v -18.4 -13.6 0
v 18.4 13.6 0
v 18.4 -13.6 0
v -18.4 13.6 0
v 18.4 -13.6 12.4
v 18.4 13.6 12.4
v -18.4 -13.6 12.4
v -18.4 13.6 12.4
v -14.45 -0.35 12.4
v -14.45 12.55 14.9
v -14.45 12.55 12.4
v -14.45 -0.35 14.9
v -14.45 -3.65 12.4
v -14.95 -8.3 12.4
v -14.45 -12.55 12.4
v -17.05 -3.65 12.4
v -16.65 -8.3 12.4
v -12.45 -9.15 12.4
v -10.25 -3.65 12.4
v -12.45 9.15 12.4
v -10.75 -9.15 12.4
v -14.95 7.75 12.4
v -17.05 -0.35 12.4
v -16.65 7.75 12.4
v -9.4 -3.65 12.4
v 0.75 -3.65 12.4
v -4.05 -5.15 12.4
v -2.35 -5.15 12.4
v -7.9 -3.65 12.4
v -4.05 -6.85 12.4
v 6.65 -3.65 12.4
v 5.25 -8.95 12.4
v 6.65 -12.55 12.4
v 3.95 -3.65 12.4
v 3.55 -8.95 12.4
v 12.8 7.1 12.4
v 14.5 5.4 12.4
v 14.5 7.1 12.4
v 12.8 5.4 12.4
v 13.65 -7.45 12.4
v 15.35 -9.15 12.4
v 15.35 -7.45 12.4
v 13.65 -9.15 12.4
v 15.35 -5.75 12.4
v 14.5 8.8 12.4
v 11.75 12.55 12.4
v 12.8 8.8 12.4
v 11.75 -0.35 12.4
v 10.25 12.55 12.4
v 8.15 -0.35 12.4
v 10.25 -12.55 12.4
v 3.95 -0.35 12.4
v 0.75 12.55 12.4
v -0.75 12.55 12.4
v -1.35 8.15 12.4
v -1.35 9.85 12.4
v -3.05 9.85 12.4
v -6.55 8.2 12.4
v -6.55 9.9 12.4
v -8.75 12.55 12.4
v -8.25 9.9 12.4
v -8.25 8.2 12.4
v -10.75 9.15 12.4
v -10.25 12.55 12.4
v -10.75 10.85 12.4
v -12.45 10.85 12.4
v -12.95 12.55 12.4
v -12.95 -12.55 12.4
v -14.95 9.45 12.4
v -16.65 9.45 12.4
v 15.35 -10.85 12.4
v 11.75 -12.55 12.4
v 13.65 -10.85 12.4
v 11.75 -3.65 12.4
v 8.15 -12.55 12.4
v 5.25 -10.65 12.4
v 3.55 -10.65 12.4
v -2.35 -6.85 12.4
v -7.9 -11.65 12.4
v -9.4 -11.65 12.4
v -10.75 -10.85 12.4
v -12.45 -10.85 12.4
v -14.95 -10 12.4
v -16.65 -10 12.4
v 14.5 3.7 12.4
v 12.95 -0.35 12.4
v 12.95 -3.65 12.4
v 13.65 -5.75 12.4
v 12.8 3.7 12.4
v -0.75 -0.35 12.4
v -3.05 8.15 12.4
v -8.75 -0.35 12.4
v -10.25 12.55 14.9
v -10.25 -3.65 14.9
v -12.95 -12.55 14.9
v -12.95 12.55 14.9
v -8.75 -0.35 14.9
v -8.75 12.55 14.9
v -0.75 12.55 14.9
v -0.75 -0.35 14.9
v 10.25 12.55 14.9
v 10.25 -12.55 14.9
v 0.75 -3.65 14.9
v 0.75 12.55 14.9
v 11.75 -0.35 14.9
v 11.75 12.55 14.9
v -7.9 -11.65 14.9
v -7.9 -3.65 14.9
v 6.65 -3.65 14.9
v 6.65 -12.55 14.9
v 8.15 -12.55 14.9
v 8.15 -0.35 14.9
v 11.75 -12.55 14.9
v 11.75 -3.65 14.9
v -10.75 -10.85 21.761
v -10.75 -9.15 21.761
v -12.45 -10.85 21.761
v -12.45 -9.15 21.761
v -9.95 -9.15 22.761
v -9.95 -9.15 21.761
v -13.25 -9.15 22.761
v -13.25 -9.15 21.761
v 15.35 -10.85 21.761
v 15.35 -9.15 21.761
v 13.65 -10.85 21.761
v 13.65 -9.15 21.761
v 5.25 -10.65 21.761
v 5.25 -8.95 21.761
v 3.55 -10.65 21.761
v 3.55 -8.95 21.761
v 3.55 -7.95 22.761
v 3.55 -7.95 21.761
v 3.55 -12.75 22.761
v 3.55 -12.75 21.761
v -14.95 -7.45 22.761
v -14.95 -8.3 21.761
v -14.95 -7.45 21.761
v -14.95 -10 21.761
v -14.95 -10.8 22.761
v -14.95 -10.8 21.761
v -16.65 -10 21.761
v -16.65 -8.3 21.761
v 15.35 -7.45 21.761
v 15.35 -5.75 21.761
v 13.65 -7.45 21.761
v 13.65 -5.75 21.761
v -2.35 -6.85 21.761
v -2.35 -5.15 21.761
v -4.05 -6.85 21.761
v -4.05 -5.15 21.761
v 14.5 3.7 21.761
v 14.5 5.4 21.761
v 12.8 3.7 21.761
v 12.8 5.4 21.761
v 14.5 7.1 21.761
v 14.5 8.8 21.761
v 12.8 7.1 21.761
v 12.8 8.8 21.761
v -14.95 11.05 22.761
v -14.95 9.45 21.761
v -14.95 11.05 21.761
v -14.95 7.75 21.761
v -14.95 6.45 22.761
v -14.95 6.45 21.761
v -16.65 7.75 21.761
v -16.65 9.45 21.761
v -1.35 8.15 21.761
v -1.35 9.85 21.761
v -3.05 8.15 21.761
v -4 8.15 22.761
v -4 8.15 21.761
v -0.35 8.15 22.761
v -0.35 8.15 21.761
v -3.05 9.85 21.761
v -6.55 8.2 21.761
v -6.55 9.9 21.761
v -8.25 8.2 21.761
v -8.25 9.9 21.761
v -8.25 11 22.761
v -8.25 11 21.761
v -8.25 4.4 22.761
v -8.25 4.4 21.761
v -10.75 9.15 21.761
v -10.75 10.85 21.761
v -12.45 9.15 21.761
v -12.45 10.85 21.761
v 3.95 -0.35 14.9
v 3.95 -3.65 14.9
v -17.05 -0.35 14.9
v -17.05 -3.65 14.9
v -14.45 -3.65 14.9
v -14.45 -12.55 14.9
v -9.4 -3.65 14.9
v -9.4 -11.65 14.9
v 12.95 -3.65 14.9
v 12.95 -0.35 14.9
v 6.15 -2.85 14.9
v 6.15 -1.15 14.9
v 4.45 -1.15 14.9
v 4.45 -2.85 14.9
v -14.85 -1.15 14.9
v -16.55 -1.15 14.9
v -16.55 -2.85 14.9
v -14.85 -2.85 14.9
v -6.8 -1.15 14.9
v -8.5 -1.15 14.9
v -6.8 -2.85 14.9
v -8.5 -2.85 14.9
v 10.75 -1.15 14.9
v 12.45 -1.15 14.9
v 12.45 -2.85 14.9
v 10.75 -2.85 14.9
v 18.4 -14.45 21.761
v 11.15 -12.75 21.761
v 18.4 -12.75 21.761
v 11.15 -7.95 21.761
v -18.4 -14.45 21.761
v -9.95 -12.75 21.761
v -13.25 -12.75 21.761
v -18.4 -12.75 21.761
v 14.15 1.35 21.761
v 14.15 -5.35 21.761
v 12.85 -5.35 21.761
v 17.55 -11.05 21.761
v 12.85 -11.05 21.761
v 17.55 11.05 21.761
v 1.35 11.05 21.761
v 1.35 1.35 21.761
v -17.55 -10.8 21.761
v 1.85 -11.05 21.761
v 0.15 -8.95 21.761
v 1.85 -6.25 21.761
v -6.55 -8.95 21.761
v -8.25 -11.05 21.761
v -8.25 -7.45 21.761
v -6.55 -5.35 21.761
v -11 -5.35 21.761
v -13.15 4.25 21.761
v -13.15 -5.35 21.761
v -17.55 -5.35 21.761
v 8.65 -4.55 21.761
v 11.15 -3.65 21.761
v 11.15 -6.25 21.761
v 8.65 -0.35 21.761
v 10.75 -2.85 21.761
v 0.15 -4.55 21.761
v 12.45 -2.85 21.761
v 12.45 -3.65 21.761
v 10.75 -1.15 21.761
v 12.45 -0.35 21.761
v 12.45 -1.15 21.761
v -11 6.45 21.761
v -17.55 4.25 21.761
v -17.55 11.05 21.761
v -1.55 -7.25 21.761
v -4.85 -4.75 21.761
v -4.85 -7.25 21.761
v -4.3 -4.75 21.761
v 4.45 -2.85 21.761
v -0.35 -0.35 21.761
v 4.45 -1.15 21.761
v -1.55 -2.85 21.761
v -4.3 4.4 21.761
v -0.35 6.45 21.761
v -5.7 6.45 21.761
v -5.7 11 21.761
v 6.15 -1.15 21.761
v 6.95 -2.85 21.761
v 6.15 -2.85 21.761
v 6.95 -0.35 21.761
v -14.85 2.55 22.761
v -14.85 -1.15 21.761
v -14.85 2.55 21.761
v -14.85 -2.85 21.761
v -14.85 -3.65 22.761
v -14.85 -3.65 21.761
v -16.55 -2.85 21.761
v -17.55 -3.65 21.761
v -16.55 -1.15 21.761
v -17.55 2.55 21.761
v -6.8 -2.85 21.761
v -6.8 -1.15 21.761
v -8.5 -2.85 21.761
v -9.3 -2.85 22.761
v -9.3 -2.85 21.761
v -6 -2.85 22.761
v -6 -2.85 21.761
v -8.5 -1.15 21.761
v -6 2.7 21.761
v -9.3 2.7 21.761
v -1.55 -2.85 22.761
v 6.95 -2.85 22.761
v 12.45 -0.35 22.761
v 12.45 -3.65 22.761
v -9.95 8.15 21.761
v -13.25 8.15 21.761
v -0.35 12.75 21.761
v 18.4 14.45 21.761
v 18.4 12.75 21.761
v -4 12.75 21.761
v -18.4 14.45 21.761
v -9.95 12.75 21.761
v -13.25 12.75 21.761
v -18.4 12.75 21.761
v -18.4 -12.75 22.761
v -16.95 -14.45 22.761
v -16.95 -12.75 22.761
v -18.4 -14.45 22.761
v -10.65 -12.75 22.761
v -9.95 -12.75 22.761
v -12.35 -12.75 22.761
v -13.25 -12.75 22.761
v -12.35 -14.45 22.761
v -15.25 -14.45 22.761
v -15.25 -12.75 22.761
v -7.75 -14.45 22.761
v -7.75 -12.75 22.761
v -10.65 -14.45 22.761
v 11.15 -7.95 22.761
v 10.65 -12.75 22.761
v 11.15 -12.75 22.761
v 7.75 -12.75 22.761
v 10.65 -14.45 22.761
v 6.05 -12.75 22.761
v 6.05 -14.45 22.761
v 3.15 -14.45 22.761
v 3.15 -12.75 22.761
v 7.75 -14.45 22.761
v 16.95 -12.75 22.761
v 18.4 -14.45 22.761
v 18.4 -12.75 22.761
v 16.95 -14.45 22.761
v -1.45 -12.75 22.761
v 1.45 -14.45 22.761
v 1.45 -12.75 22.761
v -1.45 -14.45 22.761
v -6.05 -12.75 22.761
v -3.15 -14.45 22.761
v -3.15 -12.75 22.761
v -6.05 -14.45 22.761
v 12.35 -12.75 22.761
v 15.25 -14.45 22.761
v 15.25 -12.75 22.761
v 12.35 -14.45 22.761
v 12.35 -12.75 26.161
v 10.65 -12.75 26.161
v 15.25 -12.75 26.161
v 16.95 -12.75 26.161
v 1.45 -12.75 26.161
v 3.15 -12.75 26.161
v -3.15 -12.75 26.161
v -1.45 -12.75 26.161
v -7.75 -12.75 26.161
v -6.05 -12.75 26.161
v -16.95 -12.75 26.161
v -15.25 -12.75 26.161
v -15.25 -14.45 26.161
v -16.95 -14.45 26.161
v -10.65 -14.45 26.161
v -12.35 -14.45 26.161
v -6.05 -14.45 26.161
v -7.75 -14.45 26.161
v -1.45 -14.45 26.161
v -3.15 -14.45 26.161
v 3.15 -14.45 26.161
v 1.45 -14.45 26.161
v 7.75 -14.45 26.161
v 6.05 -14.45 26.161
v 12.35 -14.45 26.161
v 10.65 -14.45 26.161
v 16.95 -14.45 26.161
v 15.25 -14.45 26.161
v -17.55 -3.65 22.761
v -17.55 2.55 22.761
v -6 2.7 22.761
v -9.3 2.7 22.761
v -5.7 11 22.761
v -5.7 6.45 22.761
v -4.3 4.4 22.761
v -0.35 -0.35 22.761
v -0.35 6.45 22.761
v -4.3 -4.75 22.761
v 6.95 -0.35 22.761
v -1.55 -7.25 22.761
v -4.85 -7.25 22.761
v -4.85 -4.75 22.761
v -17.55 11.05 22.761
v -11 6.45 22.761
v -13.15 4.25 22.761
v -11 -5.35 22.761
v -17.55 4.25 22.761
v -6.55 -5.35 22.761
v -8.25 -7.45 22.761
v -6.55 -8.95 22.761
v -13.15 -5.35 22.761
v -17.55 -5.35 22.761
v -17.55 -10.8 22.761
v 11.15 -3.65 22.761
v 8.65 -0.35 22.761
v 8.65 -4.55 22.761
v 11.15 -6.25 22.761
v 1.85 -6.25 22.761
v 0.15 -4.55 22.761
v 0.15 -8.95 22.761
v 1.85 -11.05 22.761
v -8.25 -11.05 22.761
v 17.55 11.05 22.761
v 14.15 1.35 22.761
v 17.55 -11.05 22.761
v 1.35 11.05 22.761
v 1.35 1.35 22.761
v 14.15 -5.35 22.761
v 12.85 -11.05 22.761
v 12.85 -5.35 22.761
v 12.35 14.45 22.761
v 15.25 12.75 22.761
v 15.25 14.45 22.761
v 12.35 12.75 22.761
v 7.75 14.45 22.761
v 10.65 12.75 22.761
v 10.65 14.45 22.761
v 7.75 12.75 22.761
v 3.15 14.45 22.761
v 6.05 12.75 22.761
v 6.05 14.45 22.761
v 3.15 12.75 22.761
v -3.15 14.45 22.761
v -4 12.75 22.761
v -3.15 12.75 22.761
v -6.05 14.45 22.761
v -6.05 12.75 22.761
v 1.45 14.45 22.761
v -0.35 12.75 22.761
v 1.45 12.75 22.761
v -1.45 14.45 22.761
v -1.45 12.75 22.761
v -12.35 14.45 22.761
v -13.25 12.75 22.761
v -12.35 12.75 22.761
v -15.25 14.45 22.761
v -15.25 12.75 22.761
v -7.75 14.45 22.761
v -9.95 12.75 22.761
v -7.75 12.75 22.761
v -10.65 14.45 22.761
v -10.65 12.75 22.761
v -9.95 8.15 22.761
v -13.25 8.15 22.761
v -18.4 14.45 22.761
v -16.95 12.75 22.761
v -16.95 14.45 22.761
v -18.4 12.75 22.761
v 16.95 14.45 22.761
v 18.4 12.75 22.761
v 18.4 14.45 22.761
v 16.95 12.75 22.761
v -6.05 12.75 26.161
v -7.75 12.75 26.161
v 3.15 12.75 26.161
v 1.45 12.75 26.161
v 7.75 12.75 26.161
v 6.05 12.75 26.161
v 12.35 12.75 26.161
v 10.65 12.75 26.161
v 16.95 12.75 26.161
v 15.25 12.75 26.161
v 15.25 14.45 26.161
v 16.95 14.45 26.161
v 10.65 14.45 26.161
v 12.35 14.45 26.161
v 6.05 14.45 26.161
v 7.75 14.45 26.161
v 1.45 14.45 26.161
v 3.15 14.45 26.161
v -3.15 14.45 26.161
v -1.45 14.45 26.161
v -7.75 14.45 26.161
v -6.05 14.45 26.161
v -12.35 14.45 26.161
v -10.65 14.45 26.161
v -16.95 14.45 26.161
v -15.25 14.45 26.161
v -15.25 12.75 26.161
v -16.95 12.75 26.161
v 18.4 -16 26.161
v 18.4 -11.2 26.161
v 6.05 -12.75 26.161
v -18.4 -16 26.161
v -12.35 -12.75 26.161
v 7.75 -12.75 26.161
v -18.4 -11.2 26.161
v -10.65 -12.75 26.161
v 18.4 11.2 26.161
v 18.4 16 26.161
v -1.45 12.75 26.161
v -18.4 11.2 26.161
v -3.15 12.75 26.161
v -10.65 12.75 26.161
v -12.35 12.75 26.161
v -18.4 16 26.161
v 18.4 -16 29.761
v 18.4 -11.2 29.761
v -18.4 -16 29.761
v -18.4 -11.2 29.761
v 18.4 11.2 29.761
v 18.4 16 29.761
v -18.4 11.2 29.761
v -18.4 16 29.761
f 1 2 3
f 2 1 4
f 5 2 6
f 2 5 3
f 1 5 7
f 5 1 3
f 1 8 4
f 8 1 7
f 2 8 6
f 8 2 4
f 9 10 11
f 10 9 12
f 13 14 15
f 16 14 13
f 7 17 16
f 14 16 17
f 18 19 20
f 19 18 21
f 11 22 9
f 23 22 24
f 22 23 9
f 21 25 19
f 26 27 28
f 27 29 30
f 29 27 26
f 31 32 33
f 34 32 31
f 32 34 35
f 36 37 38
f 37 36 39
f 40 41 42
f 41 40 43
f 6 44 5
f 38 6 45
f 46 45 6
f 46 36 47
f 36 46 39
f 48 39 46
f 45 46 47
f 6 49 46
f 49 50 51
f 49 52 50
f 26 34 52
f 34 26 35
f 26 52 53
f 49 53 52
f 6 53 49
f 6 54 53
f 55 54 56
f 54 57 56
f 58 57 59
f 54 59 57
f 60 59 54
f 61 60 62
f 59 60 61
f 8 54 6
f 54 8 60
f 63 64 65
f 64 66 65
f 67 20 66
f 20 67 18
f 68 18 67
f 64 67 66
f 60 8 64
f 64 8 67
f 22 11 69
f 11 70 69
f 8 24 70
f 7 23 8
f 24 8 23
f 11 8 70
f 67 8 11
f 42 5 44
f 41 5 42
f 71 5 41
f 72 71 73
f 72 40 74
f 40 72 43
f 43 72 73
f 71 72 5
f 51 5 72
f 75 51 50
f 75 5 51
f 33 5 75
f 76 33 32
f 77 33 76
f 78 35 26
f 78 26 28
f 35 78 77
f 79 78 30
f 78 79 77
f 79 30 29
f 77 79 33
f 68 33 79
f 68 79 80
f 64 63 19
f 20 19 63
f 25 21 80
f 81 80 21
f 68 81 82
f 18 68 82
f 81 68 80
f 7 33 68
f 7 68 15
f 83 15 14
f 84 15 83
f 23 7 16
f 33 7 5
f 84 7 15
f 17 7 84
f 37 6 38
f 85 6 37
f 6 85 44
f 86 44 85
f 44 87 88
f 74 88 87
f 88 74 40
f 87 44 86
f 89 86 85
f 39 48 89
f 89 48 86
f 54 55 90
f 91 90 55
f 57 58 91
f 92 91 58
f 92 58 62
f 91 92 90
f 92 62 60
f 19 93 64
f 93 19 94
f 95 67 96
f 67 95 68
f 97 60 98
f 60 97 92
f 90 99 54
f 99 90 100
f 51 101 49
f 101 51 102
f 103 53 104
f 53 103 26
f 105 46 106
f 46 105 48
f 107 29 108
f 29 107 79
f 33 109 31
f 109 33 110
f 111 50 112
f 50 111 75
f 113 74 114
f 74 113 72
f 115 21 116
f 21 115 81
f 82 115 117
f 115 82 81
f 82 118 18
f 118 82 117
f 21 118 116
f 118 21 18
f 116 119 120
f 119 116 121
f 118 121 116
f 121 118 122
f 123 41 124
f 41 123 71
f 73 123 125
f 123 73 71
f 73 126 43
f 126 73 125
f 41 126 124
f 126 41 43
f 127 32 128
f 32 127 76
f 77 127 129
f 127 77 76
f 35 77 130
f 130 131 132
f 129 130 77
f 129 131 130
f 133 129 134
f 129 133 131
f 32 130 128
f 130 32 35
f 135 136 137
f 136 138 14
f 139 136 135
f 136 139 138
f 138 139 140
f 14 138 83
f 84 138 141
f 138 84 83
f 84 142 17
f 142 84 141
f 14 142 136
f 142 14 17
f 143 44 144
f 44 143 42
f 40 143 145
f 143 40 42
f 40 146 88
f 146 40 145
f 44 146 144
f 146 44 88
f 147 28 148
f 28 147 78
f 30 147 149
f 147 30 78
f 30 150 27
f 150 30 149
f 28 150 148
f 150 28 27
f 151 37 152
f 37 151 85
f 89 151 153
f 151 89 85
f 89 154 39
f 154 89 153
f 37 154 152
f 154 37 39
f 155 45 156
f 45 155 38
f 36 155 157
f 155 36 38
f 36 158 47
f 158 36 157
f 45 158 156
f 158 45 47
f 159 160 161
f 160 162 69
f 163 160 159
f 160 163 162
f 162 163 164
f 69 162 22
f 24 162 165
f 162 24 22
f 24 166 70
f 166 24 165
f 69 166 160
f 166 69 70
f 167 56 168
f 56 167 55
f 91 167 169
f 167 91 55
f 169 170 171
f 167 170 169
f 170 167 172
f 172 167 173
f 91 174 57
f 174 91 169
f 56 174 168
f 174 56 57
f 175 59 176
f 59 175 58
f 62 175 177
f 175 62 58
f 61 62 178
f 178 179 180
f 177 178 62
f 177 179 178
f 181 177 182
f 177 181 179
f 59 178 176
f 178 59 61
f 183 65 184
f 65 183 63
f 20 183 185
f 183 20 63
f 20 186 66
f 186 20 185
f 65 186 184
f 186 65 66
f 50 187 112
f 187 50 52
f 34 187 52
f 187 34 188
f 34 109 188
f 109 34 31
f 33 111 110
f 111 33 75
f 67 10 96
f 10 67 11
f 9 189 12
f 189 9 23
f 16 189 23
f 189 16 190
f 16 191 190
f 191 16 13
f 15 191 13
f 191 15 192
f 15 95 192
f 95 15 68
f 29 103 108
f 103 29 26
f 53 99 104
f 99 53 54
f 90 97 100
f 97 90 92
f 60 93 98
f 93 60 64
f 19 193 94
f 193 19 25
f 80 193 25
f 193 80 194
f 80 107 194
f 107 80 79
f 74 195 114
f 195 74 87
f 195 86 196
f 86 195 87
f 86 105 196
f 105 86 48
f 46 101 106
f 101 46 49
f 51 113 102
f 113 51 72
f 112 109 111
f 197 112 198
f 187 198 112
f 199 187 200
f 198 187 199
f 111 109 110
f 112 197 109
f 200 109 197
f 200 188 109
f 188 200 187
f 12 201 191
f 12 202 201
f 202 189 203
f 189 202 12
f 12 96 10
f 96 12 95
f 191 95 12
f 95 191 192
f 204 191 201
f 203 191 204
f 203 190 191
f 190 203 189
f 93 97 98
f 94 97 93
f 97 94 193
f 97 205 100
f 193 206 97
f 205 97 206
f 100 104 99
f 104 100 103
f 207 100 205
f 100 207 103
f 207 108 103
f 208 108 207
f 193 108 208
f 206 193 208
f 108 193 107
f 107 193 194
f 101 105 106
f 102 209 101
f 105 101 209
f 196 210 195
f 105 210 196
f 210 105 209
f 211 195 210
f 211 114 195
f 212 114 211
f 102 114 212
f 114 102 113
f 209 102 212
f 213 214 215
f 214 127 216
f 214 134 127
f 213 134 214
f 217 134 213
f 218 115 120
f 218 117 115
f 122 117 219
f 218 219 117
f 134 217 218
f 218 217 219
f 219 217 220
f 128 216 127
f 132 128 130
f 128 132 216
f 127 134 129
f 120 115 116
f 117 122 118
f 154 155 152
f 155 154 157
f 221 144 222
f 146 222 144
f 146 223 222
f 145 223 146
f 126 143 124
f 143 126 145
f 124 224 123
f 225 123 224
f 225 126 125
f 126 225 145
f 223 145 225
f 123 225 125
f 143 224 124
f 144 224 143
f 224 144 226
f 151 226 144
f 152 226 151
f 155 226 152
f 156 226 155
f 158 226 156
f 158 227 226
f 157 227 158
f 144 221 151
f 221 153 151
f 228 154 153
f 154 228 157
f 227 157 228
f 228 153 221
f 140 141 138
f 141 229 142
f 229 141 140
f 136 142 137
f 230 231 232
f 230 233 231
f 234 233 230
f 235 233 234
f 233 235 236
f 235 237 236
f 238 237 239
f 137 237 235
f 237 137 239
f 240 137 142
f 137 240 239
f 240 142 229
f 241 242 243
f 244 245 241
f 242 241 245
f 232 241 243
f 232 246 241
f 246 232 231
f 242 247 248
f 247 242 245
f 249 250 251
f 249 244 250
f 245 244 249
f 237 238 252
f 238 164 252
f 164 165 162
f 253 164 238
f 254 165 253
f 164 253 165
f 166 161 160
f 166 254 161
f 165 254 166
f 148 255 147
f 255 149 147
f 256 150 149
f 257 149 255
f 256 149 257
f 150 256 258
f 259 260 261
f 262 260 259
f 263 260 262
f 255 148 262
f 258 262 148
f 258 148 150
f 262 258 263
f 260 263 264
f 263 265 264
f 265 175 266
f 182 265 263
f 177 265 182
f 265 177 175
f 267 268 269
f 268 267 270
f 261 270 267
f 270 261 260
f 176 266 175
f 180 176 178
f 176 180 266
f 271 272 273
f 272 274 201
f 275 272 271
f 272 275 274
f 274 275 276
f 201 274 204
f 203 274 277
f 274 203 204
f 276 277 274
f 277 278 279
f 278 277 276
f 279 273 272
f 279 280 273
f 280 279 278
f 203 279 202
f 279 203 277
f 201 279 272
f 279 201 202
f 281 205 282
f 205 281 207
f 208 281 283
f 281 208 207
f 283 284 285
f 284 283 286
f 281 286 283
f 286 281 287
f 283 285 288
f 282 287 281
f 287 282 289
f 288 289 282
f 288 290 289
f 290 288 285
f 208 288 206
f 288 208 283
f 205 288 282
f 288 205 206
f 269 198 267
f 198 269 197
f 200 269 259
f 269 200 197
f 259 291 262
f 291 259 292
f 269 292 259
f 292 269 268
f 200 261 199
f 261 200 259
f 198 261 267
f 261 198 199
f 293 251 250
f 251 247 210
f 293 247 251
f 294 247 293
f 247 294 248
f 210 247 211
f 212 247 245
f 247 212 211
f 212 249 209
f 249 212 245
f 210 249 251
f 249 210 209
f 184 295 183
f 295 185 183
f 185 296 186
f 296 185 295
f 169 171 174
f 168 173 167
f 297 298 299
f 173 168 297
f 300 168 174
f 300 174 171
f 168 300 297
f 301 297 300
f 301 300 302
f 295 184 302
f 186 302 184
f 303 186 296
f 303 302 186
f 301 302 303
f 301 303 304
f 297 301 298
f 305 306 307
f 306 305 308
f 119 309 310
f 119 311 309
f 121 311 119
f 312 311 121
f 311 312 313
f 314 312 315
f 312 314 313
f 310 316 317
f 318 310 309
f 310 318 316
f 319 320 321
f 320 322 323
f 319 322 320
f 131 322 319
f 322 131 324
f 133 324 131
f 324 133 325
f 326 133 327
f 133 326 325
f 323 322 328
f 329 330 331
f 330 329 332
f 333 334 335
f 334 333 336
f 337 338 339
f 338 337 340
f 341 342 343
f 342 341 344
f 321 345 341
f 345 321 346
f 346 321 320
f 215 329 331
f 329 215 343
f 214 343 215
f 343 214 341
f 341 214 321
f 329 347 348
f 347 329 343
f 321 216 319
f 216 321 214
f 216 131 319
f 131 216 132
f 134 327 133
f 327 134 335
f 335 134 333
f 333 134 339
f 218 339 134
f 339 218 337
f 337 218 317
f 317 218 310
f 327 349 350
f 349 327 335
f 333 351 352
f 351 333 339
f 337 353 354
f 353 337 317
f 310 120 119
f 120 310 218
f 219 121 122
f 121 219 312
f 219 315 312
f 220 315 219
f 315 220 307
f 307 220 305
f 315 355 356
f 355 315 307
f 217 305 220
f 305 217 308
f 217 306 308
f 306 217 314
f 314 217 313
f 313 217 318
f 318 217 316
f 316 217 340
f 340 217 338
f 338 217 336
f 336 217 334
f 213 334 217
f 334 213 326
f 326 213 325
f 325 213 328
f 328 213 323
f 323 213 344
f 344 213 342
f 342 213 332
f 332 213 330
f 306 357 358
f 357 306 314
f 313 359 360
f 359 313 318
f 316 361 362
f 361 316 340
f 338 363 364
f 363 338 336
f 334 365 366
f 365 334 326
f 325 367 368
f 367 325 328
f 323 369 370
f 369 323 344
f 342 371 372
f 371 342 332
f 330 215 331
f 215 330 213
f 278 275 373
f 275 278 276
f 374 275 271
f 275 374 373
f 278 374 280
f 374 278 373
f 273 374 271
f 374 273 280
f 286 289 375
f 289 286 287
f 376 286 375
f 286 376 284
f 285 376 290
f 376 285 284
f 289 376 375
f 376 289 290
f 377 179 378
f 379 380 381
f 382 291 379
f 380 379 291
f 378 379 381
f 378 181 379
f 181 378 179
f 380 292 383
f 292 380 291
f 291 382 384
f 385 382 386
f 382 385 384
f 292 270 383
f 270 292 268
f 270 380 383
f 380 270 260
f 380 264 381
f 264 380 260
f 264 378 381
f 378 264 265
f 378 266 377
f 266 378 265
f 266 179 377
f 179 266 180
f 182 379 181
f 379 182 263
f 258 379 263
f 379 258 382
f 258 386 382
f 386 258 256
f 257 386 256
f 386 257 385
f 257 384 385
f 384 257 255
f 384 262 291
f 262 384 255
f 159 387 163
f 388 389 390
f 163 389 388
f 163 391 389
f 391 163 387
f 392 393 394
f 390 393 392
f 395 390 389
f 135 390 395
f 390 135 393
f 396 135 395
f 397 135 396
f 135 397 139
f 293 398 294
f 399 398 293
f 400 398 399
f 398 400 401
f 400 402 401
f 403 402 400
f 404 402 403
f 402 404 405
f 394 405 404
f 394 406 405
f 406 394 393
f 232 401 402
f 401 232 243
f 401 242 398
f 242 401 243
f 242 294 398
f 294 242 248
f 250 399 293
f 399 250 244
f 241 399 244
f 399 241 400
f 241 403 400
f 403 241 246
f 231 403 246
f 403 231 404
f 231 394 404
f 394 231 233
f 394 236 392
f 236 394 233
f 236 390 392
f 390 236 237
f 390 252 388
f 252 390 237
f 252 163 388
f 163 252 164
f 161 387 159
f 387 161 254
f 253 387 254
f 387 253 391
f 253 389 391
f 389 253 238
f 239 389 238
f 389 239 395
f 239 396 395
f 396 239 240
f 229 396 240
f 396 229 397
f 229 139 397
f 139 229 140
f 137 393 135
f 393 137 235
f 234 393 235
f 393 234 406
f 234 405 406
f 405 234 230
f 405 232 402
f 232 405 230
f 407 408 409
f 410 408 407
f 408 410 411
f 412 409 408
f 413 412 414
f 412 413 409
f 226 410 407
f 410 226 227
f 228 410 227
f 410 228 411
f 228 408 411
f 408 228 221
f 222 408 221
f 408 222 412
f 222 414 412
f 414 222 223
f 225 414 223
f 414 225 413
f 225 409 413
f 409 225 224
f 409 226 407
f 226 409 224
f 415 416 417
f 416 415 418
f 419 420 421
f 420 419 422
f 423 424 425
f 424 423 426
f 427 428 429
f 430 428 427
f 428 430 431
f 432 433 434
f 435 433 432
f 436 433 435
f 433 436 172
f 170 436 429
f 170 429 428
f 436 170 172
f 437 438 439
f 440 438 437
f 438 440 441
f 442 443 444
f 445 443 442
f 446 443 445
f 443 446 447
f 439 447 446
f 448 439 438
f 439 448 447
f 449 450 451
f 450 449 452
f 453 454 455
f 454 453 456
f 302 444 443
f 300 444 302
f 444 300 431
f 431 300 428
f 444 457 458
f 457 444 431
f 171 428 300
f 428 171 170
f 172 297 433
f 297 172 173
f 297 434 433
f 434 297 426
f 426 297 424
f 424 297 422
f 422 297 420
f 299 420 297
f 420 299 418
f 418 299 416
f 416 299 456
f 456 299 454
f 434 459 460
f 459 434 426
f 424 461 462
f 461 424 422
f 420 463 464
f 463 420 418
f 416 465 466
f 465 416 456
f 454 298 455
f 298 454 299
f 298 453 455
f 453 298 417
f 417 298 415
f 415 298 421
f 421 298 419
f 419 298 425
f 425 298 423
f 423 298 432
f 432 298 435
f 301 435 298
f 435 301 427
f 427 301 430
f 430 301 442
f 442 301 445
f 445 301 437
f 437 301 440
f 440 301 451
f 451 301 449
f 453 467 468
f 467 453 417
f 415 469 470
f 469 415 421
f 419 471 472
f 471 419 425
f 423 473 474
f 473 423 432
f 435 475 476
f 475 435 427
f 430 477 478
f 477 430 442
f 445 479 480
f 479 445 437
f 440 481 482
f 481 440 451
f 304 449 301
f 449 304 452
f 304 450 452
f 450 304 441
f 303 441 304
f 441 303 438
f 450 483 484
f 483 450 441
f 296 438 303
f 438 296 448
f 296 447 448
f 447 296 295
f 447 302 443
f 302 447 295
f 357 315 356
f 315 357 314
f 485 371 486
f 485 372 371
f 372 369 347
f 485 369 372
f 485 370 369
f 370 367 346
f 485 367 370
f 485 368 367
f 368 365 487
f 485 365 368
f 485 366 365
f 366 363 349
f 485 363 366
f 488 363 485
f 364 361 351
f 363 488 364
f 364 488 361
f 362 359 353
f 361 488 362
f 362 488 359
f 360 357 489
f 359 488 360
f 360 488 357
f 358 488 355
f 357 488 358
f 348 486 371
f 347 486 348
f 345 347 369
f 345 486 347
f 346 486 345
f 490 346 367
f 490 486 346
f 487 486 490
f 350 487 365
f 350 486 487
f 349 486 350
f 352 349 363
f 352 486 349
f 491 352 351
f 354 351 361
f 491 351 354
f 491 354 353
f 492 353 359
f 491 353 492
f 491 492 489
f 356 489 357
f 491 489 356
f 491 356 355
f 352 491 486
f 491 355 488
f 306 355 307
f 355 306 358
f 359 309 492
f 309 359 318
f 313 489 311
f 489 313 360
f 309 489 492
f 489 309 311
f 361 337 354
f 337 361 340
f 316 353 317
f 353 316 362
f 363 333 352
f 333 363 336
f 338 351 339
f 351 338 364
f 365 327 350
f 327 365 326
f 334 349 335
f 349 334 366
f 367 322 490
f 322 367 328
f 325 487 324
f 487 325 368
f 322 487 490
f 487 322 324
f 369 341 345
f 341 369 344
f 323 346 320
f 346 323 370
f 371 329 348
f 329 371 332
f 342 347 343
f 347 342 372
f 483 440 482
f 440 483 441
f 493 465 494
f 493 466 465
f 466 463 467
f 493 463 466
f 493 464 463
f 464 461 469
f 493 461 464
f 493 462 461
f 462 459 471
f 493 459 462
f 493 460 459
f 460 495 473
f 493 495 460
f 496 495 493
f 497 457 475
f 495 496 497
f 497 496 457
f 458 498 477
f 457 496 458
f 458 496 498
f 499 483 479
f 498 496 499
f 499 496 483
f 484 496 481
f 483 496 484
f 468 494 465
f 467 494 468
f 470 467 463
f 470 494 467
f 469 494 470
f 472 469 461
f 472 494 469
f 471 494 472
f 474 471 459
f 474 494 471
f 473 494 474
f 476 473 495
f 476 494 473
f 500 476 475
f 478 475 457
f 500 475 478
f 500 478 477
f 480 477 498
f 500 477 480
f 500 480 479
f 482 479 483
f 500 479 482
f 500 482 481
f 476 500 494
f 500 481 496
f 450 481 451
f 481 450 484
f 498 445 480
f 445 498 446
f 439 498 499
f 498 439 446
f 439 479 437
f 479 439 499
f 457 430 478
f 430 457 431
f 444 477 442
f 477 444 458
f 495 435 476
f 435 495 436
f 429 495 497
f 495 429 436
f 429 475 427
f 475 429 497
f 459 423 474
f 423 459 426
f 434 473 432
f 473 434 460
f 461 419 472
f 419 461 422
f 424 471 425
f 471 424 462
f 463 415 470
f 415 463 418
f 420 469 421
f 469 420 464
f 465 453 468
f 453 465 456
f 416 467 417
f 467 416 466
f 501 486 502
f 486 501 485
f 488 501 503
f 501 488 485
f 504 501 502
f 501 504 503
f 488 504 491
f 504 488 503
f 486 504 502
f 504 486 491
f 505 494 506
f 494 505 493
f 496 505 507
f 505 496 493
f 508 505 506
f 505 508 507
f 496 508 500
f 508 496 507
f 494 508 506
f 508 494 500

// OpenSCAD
// Generated by SolidPython 0.4.2 on 2020-09-29 23:20:46
//!OpenSCAD

scale(v = 0.0100000000) {
	translate(v = [-1840, -1360, 0]) {
		union() {
			color(c = [0.4000000000, 0.4000000000, 0.4000000000]) {
				translate(v = [0, 0, 0]) {
					linear_extrude(height = 1000.0000000000) {
						polygon(paths = [[0, 1, 2, 3]], points = [[0, 0], [0, 2720], [3680, 2720], [3680, 0]]);
					}
				}
			}
			color(c = [0.2000000000, 0.6000000000, 0.2000000000]) {
				translate(v = [0, 0, 1000.0000000000]) {
					linear_extrude(height = 120.0000000000) {
						polygon(paths = [[0, 1, 2, 3]], points = [[0, 1305], [0, 2720], [3680, 2720], [3680, 1305]]);
					}
				}
			}
			color(c = [0.4000000000, 0.4000000000, 0.4000000000]) {
				translate(v = [0, 0, 1000.0000000000]) {
					linear_extrude(height = 120.0000000000) {
						polygon(paths = [[0, 1, 2, 3]], points = [[0, 0], [0, 1305], [3680, 1305], [3680, 0]]);
					}
				}
			}
			color(c = [0.9000000000, 0.6000000000, 0.6000000000]) {
				translate(v = [0, 0, 1120.0000000000]) {
					linear_extrude(height = 120.0000000000) {
						polygon(paths = [[0, 1, 2, 3]], points = [[135, 1845], [135, 2485], [395, 2485], [395, 1845]]);
					}
				}
			}
			color(c = [0.9000000000, 0.6000000000, 0.6000000000]) {
				translate(v = [0, 0, 1120.0000000000]) {
					linear_extrude(height = 120.0000000000) {
						polygon(paths = [[0, 1, 2, 3]], points = [[545, 1845], [545, 2485], [815, 2485], [815, 1845]]);
					}
				}
			}
			color(c = [0.9000000000, 0.6000000000, 0.6000000000]) {
				translate(v = [0, 0, 1120.0000000000]) {
					linear_extrude(height = 120.0000000000) {
						polygon(paths = [[0, 1, 2, 3]], points = [[965, 1845], [965, 2485], [1225, 2485], [1225, 1845]]);
					}
				}
			}
			color(c = [0.9000000000, 0.6000000000, 0.6000000000]) {
				translate(v = [0, 0, 1120.0000000000]) {
					linear_extrude(height = 120.0000000000) {
						polygon(paths = [[0, 1, 2, 3]], points = [[1495, 1485], [1495, 2485], [1765, 2485], [1765, 1485]]);
					}
				}
			}
			color(c = [0.9000000000, 0.6000000000, 0.6000000000]) {
				translate(v = [0, 0, 1120.0000000000]) {
					linear_extrude(height = 120.0000000000) {
						polygon(paths = [[0, 1, 2, 3]], points = [[1915, 1485], [1915, 2485], [2865, 2485], [2865, 1485]]);
					}
				}
			}
			color(c = [0.9000000000, 0.6000000000, 0.6000000000]) {
				translate(v = [0, 0, 1120.0000000000]) {
					linear_extrude(height = 120.0000000000) {
						polygon(paths = [[0, 1, 2, 3]], points = [[3015, 1485], [3015, 2485], [3330, 2485], [3330, 1485]]);
					}
				}
			}
			color(c = [0.9000000000, 0.6000000000, 0.9000000000]) {
				translate(v = [0, 0, 1120.0000000000]) {
					linear_extrude(height = 120.0000000000) {
						polygon(paths = [[0, 1, 2, 3]], points = [[135, 235], [135, 655], [395, 655], [395, 235]]);
					}
				}
			}
			color(c = [0.9000000000, 0.6000000000, 0.9000000000]) {
				translate(v = [0, 0, 1120.0000000000]) {
					linear_extrude(height = 120.0000000000) {
						polygon(paths = [[0, 1, 2, 3, 4, 5, 6, 7]], points = [[545, 235], [545, 655], [620, 655], [620, 885], [900, 885], [900, 465], [825, 465], [825, 235]]);
					}
				}
			}
			color(c = [0.9000000000, 0.6000000000, 0.9000000000]) {
				translate(v = [0, 0, 1120.0000000000]) {
					linear_extrude(height = 120.0000000000) {
						polygon(paths = [[0, 1, 2, 3]], points = [[1050, 465], [1050, 885], [1665, 885], [1665, 465]]);
					}
				}
			}
			color(c = [0.9000000000, 0.6000000000, 0.9000000000]) {
				translate(v = [0, 0, 1120.0000000000]) {
					linear_extrude(height = 120.0000000000) {
						polygon(paths = [[0, 1, 2, 3]], points = [[2155, 235], [2155, 885], [2505, 885], [2505, 235]]);
					}
				}
			}
			color(c = [0.9000000000, 0.6000000000, 0.9000000000]) {
				translate(v = [0, 0, 1120.0000000000]) {
					linear_extrude(height = 120.0000000000) {
						polygon(paths = [[0, 1, 2, 3]], points = [[2655, 235], [2655, 885], [2865, 885], [2865, 235]]);
					}
				}
			}
			color(c = [0.9000000000, 0.6000000000, 0.9000000000]) {
				translate(v = [0, 0, 1120.0000000000]) {
					linear_extrude(height = 120.0000000000) {
						polygon(paths = [[0, 1, 2, 3]], points = [[3015, 235], [3015, 885], [3455, 885], [3455, 235]]);
					}
				}
			}
			color(c = [0.2000000000, 0.6000000000, 0.2000000000]) {
				translate(v = [0, 0, 1120.0000000000]) {
					linear_extrude(height = 120.0000000000) {
						difference() {
							polygon(paths = [[0, 1, 2, 3]], points = [[0, 1305], [0, 2720], [3680, 2720], [3680, 1305]]);
							polygon(paths = [[0, 1, 2, 3]], points = [[1495, 1485], [1765, 1485], [1765, 2485], [1495, 2485]]);
							polygon(paths = [[0, 1, 2, 3]], points = [[1915, 1485], [2865, 1485], [2865, 2485], [1915, 2485]]);
							polygon(paths = [[0, 1, 2, 3]], points = [[3015, 1485], [3330, 1485], [3330, 2485], [3015, 2485]]);
							polygon(paths = [[0, 1, 2, 3]], points = [[135, 1845], [395, 1845], [395, 2485], [135, 2485]]);
							polygon(paths = [[0, 1, 2, 3]], points = [[545, 1845], [815, 1845], [815, 2485], [545, 2485]]);
							polygon(paths = [[0, 1, 2, 3]], points = [[965, 1845], [1225, 1845], [1225, 2485], [965, 2485]]);
						}
					}
				}
			}
			color(c = [0.4000000000, 0.4000000000, 0.4000000000]) {
				translate(v = [0, 0, 1120.0000000000]) {
					linear_extrude(height = 120.0000000000) {
						difference() {
							polygon(paths = [[0, 1, 2, 3]], points = [[0, 0], [0, 1305], [3680, 1305], [3680, 0]]);
							polygon(paths = [[0, 1, 2, 3]], points = [[135, 235], [395, 235], [395, 655], [135, 655]]);
							polygon(paths = [[0, 1, 2, 3]], points = [[2155, 235], [2505, 235], [2505, 885], [2155, 885]]);
							polygon(paths = [[0, 1, 2, 3]], points = [[2655, 235], [2865, 235], [2865, 885], [2655, 885]]);
							polygon(paths = [[0, 1, 2, 3]], points = [[3015, 235], [3455, 235], [3455, 885], [3015, 885]]);
							polygon(paths = [[0, 1, 2, 3]], points = [[1050, 465], [1665, 465], [1665, 885], [1050, 885]]);
							polygon(paths = [[0, 1, 2, 3, 4, 5, 6, 7]], points = [[545, 235], [825, 235], [825, 465], [900, 465], [900, 885], [620, 885], [620, 655], [545, 655]]);
						}
					}
				}
			}
			color(c = [0.1000000000, 0.1000000000, 0.1000000000]) {
				translate(v = [0, 0, 1240.0000000000]) {
					linear_extrude(height = 70.0000000000) {
						polygon(paths = [[0, 1, 2, 3]], points = [[595, 275], [595, 445], [765, 445], [765, 275]]);
					}
				}
			}
			color(c = [0.1000000000, 0.1000000000, 0.1000000000]) {
				translate(v = [0, 0, 1240.0000000000]) {
					linear_extrude(height = 70.0000000000) {
						polygon(paths = [[0, 1, 2, 3]], points = [[3205, 275], [3205, 445], [3375, 445], [3375, 275]]);
					}
				}
			}
			color(c = [0.1000000000, 0.1000000000, 0.1000000000]) {
				translate(v = [0, 0, 1240.0000000000]) {
					linear_extrude(height = 70.0000000000) {
						polygon(paths = [[0, 1, 2, 3]], points = [[2195, 295], [2195, 465], [2365, 465], [2365, 295]]);
					}
				}
			}
			color(c = [0.1000000000, 0.1000000000, 0.1000000000]) {
				translate(v = [0, 0, 1240.0000000000]) {
					linear_extrude(height = 70.0000000000) {
						polygon(paths = [[0, 1, 2, 3]], points = [[175, 360], [175, 530], [345, 530], [345, 360]]);
					}
				}
			}
			color(c = [0.1000000000, 0.1000000000, 0.1000000000]) {
				translate(v = [0, 0, 1240.0000000000]) {
					linear_extrude(height = 70.0000000000) {
						polygon(paths = [[0, 1, 2, 3]], points = [[3205, 615], [3205, 785], [3375, 785], [3375, 615]]);
					}
				}
			}
			color(c = [0.1000000000, 0.1000000000, 0.1000000000]) {
				translate(v = [0, 0, 1240.0000000000]) {
					linear_extrude(height = 70.0000000000) {
						polygon(paths = [[0, 1, 2, 3]], points = [[1435, 675], [1435, 845], [1605, 845], [1605, 675]]);
					}
				}
			}
			color(c = [0.1000000000, 0.1000000000, 0.1000000000]) {
				translate(v = [0, 0, 1240.0000000000]) {
					linear_extrude(height = 70.0000000000) {
						polygon(paths = [[0, 1, 2, 3]], points = [[3120, 1730], [3120, 1900], [3290, 1900], [3290, 1730]]);
					}
				}
			}
			color(c = [0.1000000000, 0.1000000000, 0.1000000000]) {
				translate(v = [0, 0, 1240.0000000000]) {
					linear_extrude(height = 70.0000000000) {
						polygon(paths = [[0, 1, 2, 3]], points = [[3120, 2070], [3120, 2240], [3290, 2240], [3290, 2070]]);
					}
				}
			}
			color(c = [0.1000000000, 0.1000000000, 0.1000000000]) {
				translate(v = [0, 0, 1240.0000000000]) {
					linear_extrude(height = 70.0000000000) {
						polygon(paths = [[0, 1, 2, 3]], points = [[175, 2135], [175, 2305], [345, 2305], [345, 2135]]);
					}
				}
			}
			color(c = [0.1000000000, 0.1000000000, 0.1000000000]) {
				translate(v = [0, 0, 1240.0000000000]) {
					linear_extrude(height = 70.0000000000) {
						polygon(paths = [[0, 1, 2, 3]], points = [[1535, 2175], [1535, 2345], [1705, 2345], [1705, 2175]]);
					}
				}
			}
			color(c = [0.1000000000, 0.1000000000, 0.1000000000]) {
				translate(v = [0, 0, 1240.0000000000]) {
					linear_extrude(height = 70.0000000000) {
						polygon(paths = [[0, 1, 2, 3]], points = [[1015, 2180], [1015, 2350], [1185, 2350], [1185, 2180]]);
					}
				}
			}
			color(c = [0.1000000000, 0.1000000000, 0.1000000000]) {
				translate(v = [0, 0, 1240.0000000000]) {
					linear_extrude(height = 70.0000000000) {
						polygon(paths = [[0, 1, 2, 3]], points = [[595, 2275], [595, 2445], [765, 2445], [765, 2275]]);
					}
				}
			}
			color(c = [1.0000000000, 1.0000000000, 1.0000000000]) {
				translate(v = [0, 0, 1240.0000000000]) {
					linear_extrude(height = 70.0000000000) {
						polygon(paths = [[0, 1, 2, 3, 4, 5]], points = [[2505, 105], [2505, 995], [2235, 995], [2235, 1325], [2655, 1325], [2655, 105]]);
					}
				}
			}
			color(c = [1.0000000000, 1.0000000000, 1.0000000000]) {
				translate(v = [0, 0, 1240.0000000000]) {
					linear_extrude(height = 70.0000000000) {
						polygon(paths = [[0, 1, 2, 3, 4, 5, 6, 7]], points = [[395, 105], [395, 995], [135, 995], [135, 1325], [395, 1325], [395, 2615], [545, 2615], [545, 105]]);
					}
				}
			}
			color(c = [1.0000000000, 1.0000000000, 1.0000000000]) {
				translate(v = [0, 0, 1240.0000000000]) {
					linear_extrude(height = 70.0000000000) {
						polygon(paths = [[0, 1, 2, 3, 4, 5, 6, 7, 8, 9, 10, 11]], points = [[900, 195], [900, 995], [815, 995], [815, 2615], [965, 2615], [965, 1325], [1765, 1325], [1765, 2615], [1915, 2615], [1915, 995], [1050, 995], [1050, 195]]);
					}
				}
			}
			color(c = [1.0000000000, 1.0000000000, 1.0000000000]) {
				translate(v = [0, 0, 1240.0000000000]) {
					linear_extrude(height = 70.0000000000) {
						polygon(paths = [[0, 1, 2, 3, 4, 5, 6, 7]], points = [[2865, 105], [2865, 2615], [3015, 2615], [3015, 1325], [3135, 1325], [3135, 995], [3015, 995], [3015, 105]]);
					}
				}
			}
			color(c = [0.1000000000, 0.1000000000, 0.1000000000]) {
				translate(v = [0, 0, 1310.0000000000]) {
					linear_extrude(height = 180.0000000000) {
						polygon(paths = [[0, 1, 2, 3]], points = [[595, 275], [595, 445], [765, 445], [765, 275]]);
					}
				}
			}
			color(c = [0.1000000000, 0.1000000000, 0.1000000000]) {
				translate(v = [0, 0, 1310.0000000000]) {
					linear_extrude(height = 180.0000000000) {
						polygon(paths = [[0, 1, 2, 3]], points = [[3205, 275], [3205, 445], [3375, 445], [3375, 275]]);
					}
				}
			}
			color(c = [0.1000000000, 0.1000000000, 0.1000000000]) {
				translate(v = [0, 0, 1310.0000000000]) {
					linear_extrude(height = 180.0000000000) {
						polygon(paths = [[0, 1, 2, 3]], points = [[2195, 295], [2195, 465], [2365, 465], [2365, 295]]);
					}
				}
			}
			color(c = [0.1000000000, 0.1000000000, 0.1000000000]) {
				translate(v = [0, 0, 1310.0000000000]) {
					linear_extrude(height = 180.0000000000) {
						polygon(paths = [[0, 1, 2, 3]], points = [[175, 360], [175, 530], [345, 530], [345, 360]]);
					}
				}
			}
			color(c = [0.1000000000, 0.1000000000, 0.1000000000]) {
				translate(v = [0, 0, 1310.0000000000]) {
					linear_extrude(height = 180.0000000000) {
						polygon(paths = [[0, 1, 2, 3]], points = [[3205, 615], [3205, 785], [3375, 785], [3375, 615]]);
					}
				}
			}
			color(c = [0.1000000000, 0.1000000000, 0.1000000000]) {
				translate(v = [0, 0, 1310.0000000000]) {
					linear_extrude(height = 180.0000000000) {
						polygon(paths = [[0, 1, 2, 3]], points = [[1435, 675], [1435, 845], [1605, 845], [1605, 675]]);
					}
				}
			}
			color(c = [0.1000000000, 0.1000000000, 0.1000000000]) {
				translate(v = [0, 0, 1310.0000000000]) {
					linear_extrude(height = 180.0000000000) {
						polygon(paths = [[0, 1, 2, 3]], points = [[3120, 1730], [3120, 1900], [3290, 1900], [3290, 1730]]);
					}
				}
			}
			color(c = [0.1000000000, 0.1000000000, 0.1000000000]) {
				translate(v = [0, 0, 1310.0000000000]) {
					linear_extrude(height = 180.0000000000) {
						polygon(paths = [[0, 1, 2, 3]], points = [[3120, 2070], [3120, 2240], [3290, 2240], [3290, 2070]]);
					}
				}
			}
			color(c = [0.1000000000, 0.1000000000, 0.1000000000]) {
				translate(v = [0, 0, 1310.0000000000]) {
					linear_extrude(height = 180.0000000000) {
						polygon(paths = [[0, 1, 2, 3]], points = [[175, 2135], [175, 2305], [345, 2305], [345, 2135]]);
					}
				}
			}
			color(c = [0.1000000000, 0.1000000000, 0.1000000000]) {
				translate(v = [0, 0, 1310.0000000000]) {
					linear_extrude(height = 180.0000000000) {
						polygon(paths = [[0, 1, 2, 3]], points = [[1535, 2175], [1535, 2345], [1705, 2345], [1705, 2175]]);
					}
				}
			}
			color(c = [0.1000000000, 0.1000000000, 0.1000000000]) {
				translate(v = [0, 0, 1310.0000000000]) {
					linear_extrude(height = 180.0000000000) {
						polygon(paths = [[0, 1, 2, 3]], points = [[1015, 2180], [1015, 2350], [1185, 2350], [1185, 2180]]);
					}
				}
			}
			color(c = [0.1000000000, 0.1000000000, 0.1000000000]) {
				translate(v = [0, 0, 1310.0000000000]) {
					linear_extrude(height = 180.0000000000) {
						polygon(paths = [[0, 1, 2, 3]], points = [[595, 2275], [595, 2445], [765, 2445], [765, 2275]]);
					}
				}
			}
			color(c = [0.7000000000, 0, 0]) {
				translate(v = [0, 0, 1310.0000000000]) {
					linear_extrude(height = 180.0000000000) {
						polygon(paths = [[0, 1, 2, 3, 4, 5]], points = [[2505, 105], [2505, 995], [2235, 995], [2235, 1325], [2655, 1325], [2655, 105]]);
					}
				}
			}
			color(c = [0.7000000000, 0, 0]) {
				translate(v = [0, 0, 1310.0000000000]) {
					linear_extrude(height = 180.0000000000) {
						polygon(paths = [[0, 1, 2, 3, 4, 5, 6, 7]], points = [[395, 105], [395, 995], [135, 995], [135, 1325], [395, 1325], [395, 2615], [545, 2615], [545, 105]]);
					}
				}
			}
			color(c = [0.7000000000, 0, 0]) {
				translate(v = [0, 0, 1310.0000000000]) {
					linear_extrude(height = 180.0000000000) {
						polygon(paths = [[0, 1, 2, 3, 4, 5, 6, 7, 8, 9, 10, 11]], points = [[900, 195], [900, 995], [815, 995], [815, 2615], [965, 2615], [965, 1325], [1765, 1325], [1765, 2615], [1915, 2615], [1915, 995], [1050, 995], [1050, 195]]);
					}
				}
			}
			color(c = [0.7000000000, 0, 0]) {
				translate(v = [0, 0, 1310.0000000000]) {
					linear_extrude(height = 180.0000000000) {
						polygon(paths = [[0, 1, 2, 3, 4, 5, 6, 7]], points = [[2865, 105], [2865, 2615], [3015, 2615], [3015, 1325], [3135, 1325], [3135, 995], [3015, 995], [3015, 105]]);
					}
				}
			}
			color(c = [0.1000000000, 0.1000000000, 0.1000000000]) {
				translate(v = [0, 0, 1490.0000000000]) {
					linear_extrude(height = 686.1000000000) {
						polygon(paths = [[0, 1, 2, 3]], points = [[595, 275], [595, 445], [765, 445], [765, 275]]);
					}
				}
			}
			color(c = [0.1000000000, 0.1000000000, 0.1000000000]) {
				translate(v = [0, 0, 1490.0000000000]) {
					linear_extrude(height = 686.1000000000) {
						polygon(paths = [[0, 1, 2, 3]], points = [[3205, 275], [3205, 445], [3375, 445], [3375, 275]]);
					}
				}
			}
			color(c = [0.1000000000, 0.1000000000, 0.1000000000]) {
				translate(v = [0, 0, 1490.0000000000]) {
					linear_extrude(height = 686.1000000000) {
						polygon(paths = [[0, 1, 2, 3]], points = [[2195, 295], [2195, 465], [2365, 465], [2365, 295]]);
					}
				}
			}
			color(c = [0.1000000000, 0.1000000000, 0.1000000000]) {
				translate(v = [0, 0, 1490.0000000000]) {
					linear_extrude(height = 686.1000000000) {
						polygon(paths = [[0, 1, 2, 3]], points = [[175, 360], [175, 530], [345, 530], [345, 360]]);
					}
				}
			}
			color(c = [0.1000000000, 0.1000000000, 0.1000000000]) {
				translate(v = [0, 0, 1490.0000000000]) {
					linear_extrude(height = 686.1000000000) {
						polygon(paths = [[0, 1, 2, 3]], points = [[3205, 615], [3205, 785], [3375, 785], [3375, 615]]);
					}
				}
			}
			color(c = [0.1000000000, 0.1000000000, 0.1000000000]) {
				translate(v = [0, 0, 1490.0000000000]) {
					linear_extrude(height = 686.1000000000) {
						polygon(paths = [[0, 1, 2, 3]], points = [[1435, 675], [1435, 845], [1605, 845], [1605, 675]]);
					}
				}
			}
			color(c = [0.1000000000, 0.1000000000, 0.1000000000]) {
				translate(v = [0, 0, 1490.0000000000]) {
					linear_extrude(height = 686.1000000000) {
						polygon(paths = [[0, 1, 2, 3]], points = [[185, 1075], [185, 1245], [355, 1245], [355, 1075]]);
					}
				}
			}
			color(c = [0.1000000000, 0.1000000000, 0.1000000000]) {
				translate(v = [0, 0, 1490.0000000000]) {
					linear_extrude(height = 686.1000000000) {
						polygon(paths = [[0, 1, 2, 3]], points = [[990, 1075], [990, 1245], [1160, 1245], [1160, 1075]]);
					}
				}
			}
			color(c = [0.1000000000, 0.1000000000, 0.1000000000]) {
				translate(v = [0, 0, 1490.0000000000]) {
					linear_extrude(height = 686.1000000000) {
						polygon(paths = [[0, 1, 2, 3]], points = [[2285, 1075], [2285, 1245], [2455, 1245], [2455, 1075]]);
					}
				}
			}
			color(c = [0.1000000000, 0.1000000000, 0.1000000000]) {
				translate(v = [0, 0, 1490.0000000000]) {
					linear_extrude(height = 686.1000000000) {
						polygon(paths = [[0, 1, 2, 3]], points = [[2915, 1075], [2915, 1245], [3085, 1245], [3085, 1075]]);
					}
				}
			}
			color(c = [0.1000000000, 0.1000000000, 0.1000000000]) {
				translate(v = [0, 0, 1490.0000000000]) {
					linear_extrude(height = 686.1000000000) {
						polygon(paths = [[0, 1, 2, 3]], points = [[3120, 1730], [3120, 1900], [3290, 1900], [3290, 1730]]);
					}
				}
			}
			color(c = [0.1000000000, 0.1000000000, 0.1000000000]) {
				translate(v = [0, 0, 1490.0000000000]) {
					linear_extrude(height = 686.1000000000) {
						polygon(paths = [[0, 1, 2, 3]], points = [[3120, 2070], [3120, 2240], [3290, 2240], [3290, 2070]]);
					}
				}
			}
			color(c = [0.1000000000, 0.1000000000, 0.1000000000]) {
				translate(v = [0, 0, 1490.0000000000]) {
					linear_extrude(height = 686.1000000000) {
						polygon(paths = [[0, 1, 2, 3]], points = [[175, 2135], [175, 2305], [345, 2305], [345, 2135]]);
					}
				}
			}
			color(c = [0.1000000000, 0.1000000000, 0.1000000000]) {
				translate(v = [0, 0, 1490.0000000000]) {
					linear_extrude(height = 686.1000000000) {
						polygon(paths = [[0, 1, 2, 3]], points = [[1535, 2175], [1535, 2345], [1705, 2345], [1705, 2175]]);
					}
				}
			}
			color(c = [0.1000000000, 0.1000000000, 0.1000000000]) {
				translate(v = [0, 0, 1490.0000000000]) {
					linear_extrude(height = 686.1000000000) {
						polygon(paths = [[0, 1, 2, 3]], points = [[1015, 2180], [1015, 2350], [1185, 2350], [1185, 2180]]);
					}
				}
			}
			color(c = [0.1000000000, 0.1000000000, 0.1000000000]) {
				translate(v = [0, 0, 1490.0000000000]) {
					linear_extrude(height = 686.1000000000) {
						polygon(paths = [[0, 1, 2, 3]], points = [[595, 2275], [595, 2445], [765, 2445], [765, 2275]]);
					}
				}
			}
			color(c = [0.9000000000, 0.6000000000, 0.6000000000]) {
				translate(v = [0, 0, 2176.1000000000]) {
					linear_extrude(height = 100.0000000000) {
						polygon(paths = [[0, 1, 2, 3, 4, 5, 6, 7, 8, 9, 10, 11]], points = [[0, -85], [0, 85], [515, 85], [515, 445], [845, 445], [845, 85], [2195, 85], [2195, 565], [2955, 565], [2955, 85], [3680, 85], [3680, -85]]);
					}
				}
			}
			color(c = [0.9000000000, 0.6000000000, 0.6000000000]) {
				translate(v = [0, 0, 2176.1000000000]) {
					linear_extrude(height = 100.0000000000) {
						polygon(paths = [[0, 1, 2, 3]], points = [[85, 995], [85, 1615], [355, 1615], [355, 995]]);
					}
				}
			}
			color(c = [0.9000000000, 0.6000000000, 0.6000000000]) {
				translate(v = [0, 0, 2176.1000000000]) {
					linear_extrude(height = 100.0000000000) {
						polygon(paths = [[0, 1, 2, 3]], points = [[910, 1075], [910, 1630], [1240, 1630], [1240, 1075]]);
					}
				}
			}
			color(c = [0.9000000000, 0.6000000000, 0.6000000000]) {
				translate(v = [0, 0, 2176.1000000000]) {
					linear_extrude(height = 100.0000000000) {
						polygon(paths = [[0, 1, 2, 3, 4, 5, 6, 7, 8, 9, 10, 11, 12, 13]], points = [[1355, 635], [1355, 885], [1410, 885], [1410, 1800], [1015, 1800], [1015, 2460], [1270, 2460], [1270, 2005], [1805, 2005], [1805, 1325], [2535, 1325], [2535, 1075], [1685, 1075], [1685, 635]]);
					}
				}
			}
			color(c = [0.9000000000, 0.6000000000, 0.6000000000]) {
				translate(v = [0, 0, 2176.1000000000]) {
					linear_extrude(height = 100.0000000000) {
						polygon(paths = [[0, 1, 2, 3, 4, 5, 6, 7, 8, 9, 10, 11, 12, 13, 14, 15, 16, 17, 18, 19, 20, 21, 22, 23, 24, 25]], points = [[1015, 255], [1015, 615], [345, 615], [345, 280], [85, 280], [85, 825], [525, 825], [525, 1785], [85, 1785], [85, 2465], [345, 2465], [345, 2005], [740, 2005], [740, 825], [1185, 825], [1185, 465], [1855, 465], [1855, 905], [2705, 905], [2705, 1325], [3085, 1325], [3085, 995], [2955, 995], [2955, 735], [2025, 735], [2025, 255]]);
					}
				}
			}
			color(c = [0.9000000000, 0.6000000000, 0.6000000000]) {
				translate(v = [0, 0, 2176.1000000000]) {
					linear_extrude(height = 100.0000000000) {
						polygon(paths = [[0, 1, 2, 3, 4, 5, 6, 7]], points = [[3125, 255], [3125, 825], [3255, 825], [3255, 1495], [1975, 1495], [1975, 2465], [3595, 2465], [3595, 255]]);
					}
				}
			}
			color(c = [0.9000000000, 0.6000000000, 0.6000000000]) {
				translate(v = [0, 0, 2176.1000000000]) {
					linear_extrude(height = 100.0000000000) {
						polygon(paths = [[0, 1, 2, 3, 4, 5, 6, 7, 8, 9, 10, 11]], points = [[515, 2175], [515, 2635], [0, 2635], [0, 2805], [3680, 2805], [3680, 2635], [1805, 2635], [1805, 2175], [1440, 2175], [1440, 2635], [845, 2635], [845, 2175]]);
					}
				}
			}
			color(c = [0.5000000000, 0.5000000000, 0.5000000000]) {
				translate(v = [0, 0, 2276.1000000000]) {
					linear_extrude(height = 340.0000000000) {
						polygon(paths = [[0, 1, 2, 3]], points = [[145, -85], [145, 85], [315, 85], [315, -85]]);
					}
				}
			}
			color(c = [0.5000000000, 0.5000000000, 0.5000000000]) {
				translate(v = [0, 0, 2276.1000000000]) {
					linear_extrude(height = 340.0000000000) {
						polygon(paths = [[0, 1, 2, 3]], points = [[605, -85], [605, 85], [775, 85], [775, -85]]);
					}
				}
			}
			color(c = [0.5000000000, 0.5000000000, 0.5000000000]) {
				translate(v = [0, 0, 2276.1000000000]) {
					linear_extrude(height = 340.0000000000) {
						polygon(paths = [[0, 1, 2, 3]], points = [[1065, -85], [1065, 85], [1235, 85], [1235, -85]]);
					}
				}
			}
			color(c = [0.5000000000, 0.5000000000, 0.5000000000]) {
				translate(v = [0, 0, 2276.1000000000]) {
					linear_extrude(height = 340.0000000000) {
						polygon(paths = [[0, 1, 2, 3]], points = [[1525, -85], [1525, 85], [1695, 85], [1695, -85]]);
					}
				}
			}
			color(c = [0.5000000000, 0.5000000000, 0.5000000000]) {
				translate(v = [0, 0, 2276.1000000000]) {
					linear_extrude(height = 340.0000000000) {
						polygon(paths = [[0, 1, 2, 3]], points = [[1985, -85], [1985, 85], [2155, 85], [2155, -85]]);
					}
				}
			}
			color(c = [0.5000000000, 0.5000000000, 0.5000000000]) {
				translate(v = [0, 0, 2276.1000000000]) {
					linear_extrude(height = 340.0000000000) {
						polygon(paths = [[0, 1, 2, 3]], points = [[2445, -85], [2445, 85], [2615, 85], [2615, -85]]);
					}
				}
			}
			color(c = [0.5000000000, 0.5000000000, 0.5000000000]) {
				translate(v = [0, 0, 2276.1000000000]) {
					linear_extrude(height = 340.0000000000) {
						polygon(paths = [[0, 1, 2, 3]], points = [[2905, -85], [2905, 85], [3075, 85], [3075, -85]]);
					}
				}
			}
			color(c = [0.5000000000, 0.5000000000, 0.5000000000]) {
				translate(v = [0, 0, 2276.1000000000]) {
					linear_extrude(height = 340.0000000000) {
						polygon(paths = [[0, 1, 2, 3]], points = [[3365, -85], [3365, 85], [3535, 85], [3535, -85]]);
					}
				}
			}
			color(c = [0.5000000000, 0.5000000000, 0.5000000000]) {
				translate(v = [0, 0, 2276.1000000000]) {
					linear_extrude(height = 340.0000000000) {
						polygon(paths = [[0, 1, 2, 3]], points = [[145, 2635], [145, 2805], [315, 2805], [315, 2635]]);
					}
				}
			}
			color(c = [0.5000000000, 0.5000000000, 0.5000000000]) {
				translate(v = [0, 0, 2276.1000000000]) {
					linear_extrude(height = 340.0000000000) {
						polygon(paths = [[0, 1, 2, 3]], points = [[605, 2635], [605, 2805], [775, 2805], [775, 2635]]);
					}
				}
			}
			color(c = [0.5000000000, 0.5000000000, 0.5000000000]) {
				translate(v = [0, 0, 2276.1000000000]) {
					linear_extrude(height = 340.0000000000) {
						polygon(paths = [[0, 1, 2, 3]], points = [[1065, 2635], [1065, 2805], [1235, 2805], [1235, 2635]]);
					}
				}
			}
			color(c = [0.5000000000, 0.5000000000, 0.5000000000]) {
				translate(v = [0, 0, 2276.1000000000]) {
					linear_extrude(height = 340.0000000000) {
						polygon(paths = [[0, 1, 2, 3]], points = [[1525, 2635], [1525, 2805], [1695, 2805], [1695, 2635]]);
					}
				}
			}
			color(c = [0.5000000000, 0.5000000000, 0.5000000000]) {
				translate(v = [0, 0, 2276.1000000000]) {
					linear_extrude(height = 340.0000000000) {
						polygon(paths = [[0, 1, 2, 3]], points = [[1985, 2635], [1985, 2805], [2155, 2805], [2155, 2635]]);
					}
				}
			}
			color(c = [0.5000000000, 0.5000000000, 0.5000000000]) {
				translate(v = [0, 0, 2276.1000000000]) {
					linear_extrude(height = 340.0000000000) {
						polygon(paths = [[0, 1, 2, 3]], points = [[2445, 2635], [2445, 2805], [2615, 2805], [2615, 2635]]);
					}
				}
			}
			color(c = [0.5000000000, 0.5000000000, 0.5000000000]) {
				translate(v = [0, 0, 2276.1000000000]) {
					linear_extrude(height = 340.0000000000) {
						polygon(paths = [[0, 1, 2, 3]], points = [[2905, 2635], [2905, 2805], [3075, 2805], [3075, 2635]]);
					}
				}
			}
			color(c = [0.5000000000, 0.5000000000, 0.5000000000]) {
				translate(v = [0, 0, 2276.1000000000]) {
					linear_extrude(height = 340.0000000000) {
						polygon(paths = [[0, 1, 2, 3]], points = [[3365, 2635], [3365, 2805], [3535, 2805], [3535, 2635]]);
					}
				}
			}
			color(c = [0.3000000000, 0.3000000000, 1]) {
				translate(v = [0, 0, 2616.1000000000]) {
					linear_extrude(height = 360.0000000000) {
						polygon(paths = [[0, 1, 2, 3]], points = [[0, -240], [0, 240], [3680, 240], [3680, -240]]);
					}
				}
			}
			color(c = [0.3000000000, 0.3000000000, 1]) {
				translate(v = [0, 0, 2616.1000000000]) {
					linear_extrude(height = 360.0000000000) {
						polygon(paths = [[0, 1, 2, 3]], points = [[0, 2480], [0, 2960], [3680, 2960], [3680, 2480]]);
					}
				}
			}
		}
	}
}
